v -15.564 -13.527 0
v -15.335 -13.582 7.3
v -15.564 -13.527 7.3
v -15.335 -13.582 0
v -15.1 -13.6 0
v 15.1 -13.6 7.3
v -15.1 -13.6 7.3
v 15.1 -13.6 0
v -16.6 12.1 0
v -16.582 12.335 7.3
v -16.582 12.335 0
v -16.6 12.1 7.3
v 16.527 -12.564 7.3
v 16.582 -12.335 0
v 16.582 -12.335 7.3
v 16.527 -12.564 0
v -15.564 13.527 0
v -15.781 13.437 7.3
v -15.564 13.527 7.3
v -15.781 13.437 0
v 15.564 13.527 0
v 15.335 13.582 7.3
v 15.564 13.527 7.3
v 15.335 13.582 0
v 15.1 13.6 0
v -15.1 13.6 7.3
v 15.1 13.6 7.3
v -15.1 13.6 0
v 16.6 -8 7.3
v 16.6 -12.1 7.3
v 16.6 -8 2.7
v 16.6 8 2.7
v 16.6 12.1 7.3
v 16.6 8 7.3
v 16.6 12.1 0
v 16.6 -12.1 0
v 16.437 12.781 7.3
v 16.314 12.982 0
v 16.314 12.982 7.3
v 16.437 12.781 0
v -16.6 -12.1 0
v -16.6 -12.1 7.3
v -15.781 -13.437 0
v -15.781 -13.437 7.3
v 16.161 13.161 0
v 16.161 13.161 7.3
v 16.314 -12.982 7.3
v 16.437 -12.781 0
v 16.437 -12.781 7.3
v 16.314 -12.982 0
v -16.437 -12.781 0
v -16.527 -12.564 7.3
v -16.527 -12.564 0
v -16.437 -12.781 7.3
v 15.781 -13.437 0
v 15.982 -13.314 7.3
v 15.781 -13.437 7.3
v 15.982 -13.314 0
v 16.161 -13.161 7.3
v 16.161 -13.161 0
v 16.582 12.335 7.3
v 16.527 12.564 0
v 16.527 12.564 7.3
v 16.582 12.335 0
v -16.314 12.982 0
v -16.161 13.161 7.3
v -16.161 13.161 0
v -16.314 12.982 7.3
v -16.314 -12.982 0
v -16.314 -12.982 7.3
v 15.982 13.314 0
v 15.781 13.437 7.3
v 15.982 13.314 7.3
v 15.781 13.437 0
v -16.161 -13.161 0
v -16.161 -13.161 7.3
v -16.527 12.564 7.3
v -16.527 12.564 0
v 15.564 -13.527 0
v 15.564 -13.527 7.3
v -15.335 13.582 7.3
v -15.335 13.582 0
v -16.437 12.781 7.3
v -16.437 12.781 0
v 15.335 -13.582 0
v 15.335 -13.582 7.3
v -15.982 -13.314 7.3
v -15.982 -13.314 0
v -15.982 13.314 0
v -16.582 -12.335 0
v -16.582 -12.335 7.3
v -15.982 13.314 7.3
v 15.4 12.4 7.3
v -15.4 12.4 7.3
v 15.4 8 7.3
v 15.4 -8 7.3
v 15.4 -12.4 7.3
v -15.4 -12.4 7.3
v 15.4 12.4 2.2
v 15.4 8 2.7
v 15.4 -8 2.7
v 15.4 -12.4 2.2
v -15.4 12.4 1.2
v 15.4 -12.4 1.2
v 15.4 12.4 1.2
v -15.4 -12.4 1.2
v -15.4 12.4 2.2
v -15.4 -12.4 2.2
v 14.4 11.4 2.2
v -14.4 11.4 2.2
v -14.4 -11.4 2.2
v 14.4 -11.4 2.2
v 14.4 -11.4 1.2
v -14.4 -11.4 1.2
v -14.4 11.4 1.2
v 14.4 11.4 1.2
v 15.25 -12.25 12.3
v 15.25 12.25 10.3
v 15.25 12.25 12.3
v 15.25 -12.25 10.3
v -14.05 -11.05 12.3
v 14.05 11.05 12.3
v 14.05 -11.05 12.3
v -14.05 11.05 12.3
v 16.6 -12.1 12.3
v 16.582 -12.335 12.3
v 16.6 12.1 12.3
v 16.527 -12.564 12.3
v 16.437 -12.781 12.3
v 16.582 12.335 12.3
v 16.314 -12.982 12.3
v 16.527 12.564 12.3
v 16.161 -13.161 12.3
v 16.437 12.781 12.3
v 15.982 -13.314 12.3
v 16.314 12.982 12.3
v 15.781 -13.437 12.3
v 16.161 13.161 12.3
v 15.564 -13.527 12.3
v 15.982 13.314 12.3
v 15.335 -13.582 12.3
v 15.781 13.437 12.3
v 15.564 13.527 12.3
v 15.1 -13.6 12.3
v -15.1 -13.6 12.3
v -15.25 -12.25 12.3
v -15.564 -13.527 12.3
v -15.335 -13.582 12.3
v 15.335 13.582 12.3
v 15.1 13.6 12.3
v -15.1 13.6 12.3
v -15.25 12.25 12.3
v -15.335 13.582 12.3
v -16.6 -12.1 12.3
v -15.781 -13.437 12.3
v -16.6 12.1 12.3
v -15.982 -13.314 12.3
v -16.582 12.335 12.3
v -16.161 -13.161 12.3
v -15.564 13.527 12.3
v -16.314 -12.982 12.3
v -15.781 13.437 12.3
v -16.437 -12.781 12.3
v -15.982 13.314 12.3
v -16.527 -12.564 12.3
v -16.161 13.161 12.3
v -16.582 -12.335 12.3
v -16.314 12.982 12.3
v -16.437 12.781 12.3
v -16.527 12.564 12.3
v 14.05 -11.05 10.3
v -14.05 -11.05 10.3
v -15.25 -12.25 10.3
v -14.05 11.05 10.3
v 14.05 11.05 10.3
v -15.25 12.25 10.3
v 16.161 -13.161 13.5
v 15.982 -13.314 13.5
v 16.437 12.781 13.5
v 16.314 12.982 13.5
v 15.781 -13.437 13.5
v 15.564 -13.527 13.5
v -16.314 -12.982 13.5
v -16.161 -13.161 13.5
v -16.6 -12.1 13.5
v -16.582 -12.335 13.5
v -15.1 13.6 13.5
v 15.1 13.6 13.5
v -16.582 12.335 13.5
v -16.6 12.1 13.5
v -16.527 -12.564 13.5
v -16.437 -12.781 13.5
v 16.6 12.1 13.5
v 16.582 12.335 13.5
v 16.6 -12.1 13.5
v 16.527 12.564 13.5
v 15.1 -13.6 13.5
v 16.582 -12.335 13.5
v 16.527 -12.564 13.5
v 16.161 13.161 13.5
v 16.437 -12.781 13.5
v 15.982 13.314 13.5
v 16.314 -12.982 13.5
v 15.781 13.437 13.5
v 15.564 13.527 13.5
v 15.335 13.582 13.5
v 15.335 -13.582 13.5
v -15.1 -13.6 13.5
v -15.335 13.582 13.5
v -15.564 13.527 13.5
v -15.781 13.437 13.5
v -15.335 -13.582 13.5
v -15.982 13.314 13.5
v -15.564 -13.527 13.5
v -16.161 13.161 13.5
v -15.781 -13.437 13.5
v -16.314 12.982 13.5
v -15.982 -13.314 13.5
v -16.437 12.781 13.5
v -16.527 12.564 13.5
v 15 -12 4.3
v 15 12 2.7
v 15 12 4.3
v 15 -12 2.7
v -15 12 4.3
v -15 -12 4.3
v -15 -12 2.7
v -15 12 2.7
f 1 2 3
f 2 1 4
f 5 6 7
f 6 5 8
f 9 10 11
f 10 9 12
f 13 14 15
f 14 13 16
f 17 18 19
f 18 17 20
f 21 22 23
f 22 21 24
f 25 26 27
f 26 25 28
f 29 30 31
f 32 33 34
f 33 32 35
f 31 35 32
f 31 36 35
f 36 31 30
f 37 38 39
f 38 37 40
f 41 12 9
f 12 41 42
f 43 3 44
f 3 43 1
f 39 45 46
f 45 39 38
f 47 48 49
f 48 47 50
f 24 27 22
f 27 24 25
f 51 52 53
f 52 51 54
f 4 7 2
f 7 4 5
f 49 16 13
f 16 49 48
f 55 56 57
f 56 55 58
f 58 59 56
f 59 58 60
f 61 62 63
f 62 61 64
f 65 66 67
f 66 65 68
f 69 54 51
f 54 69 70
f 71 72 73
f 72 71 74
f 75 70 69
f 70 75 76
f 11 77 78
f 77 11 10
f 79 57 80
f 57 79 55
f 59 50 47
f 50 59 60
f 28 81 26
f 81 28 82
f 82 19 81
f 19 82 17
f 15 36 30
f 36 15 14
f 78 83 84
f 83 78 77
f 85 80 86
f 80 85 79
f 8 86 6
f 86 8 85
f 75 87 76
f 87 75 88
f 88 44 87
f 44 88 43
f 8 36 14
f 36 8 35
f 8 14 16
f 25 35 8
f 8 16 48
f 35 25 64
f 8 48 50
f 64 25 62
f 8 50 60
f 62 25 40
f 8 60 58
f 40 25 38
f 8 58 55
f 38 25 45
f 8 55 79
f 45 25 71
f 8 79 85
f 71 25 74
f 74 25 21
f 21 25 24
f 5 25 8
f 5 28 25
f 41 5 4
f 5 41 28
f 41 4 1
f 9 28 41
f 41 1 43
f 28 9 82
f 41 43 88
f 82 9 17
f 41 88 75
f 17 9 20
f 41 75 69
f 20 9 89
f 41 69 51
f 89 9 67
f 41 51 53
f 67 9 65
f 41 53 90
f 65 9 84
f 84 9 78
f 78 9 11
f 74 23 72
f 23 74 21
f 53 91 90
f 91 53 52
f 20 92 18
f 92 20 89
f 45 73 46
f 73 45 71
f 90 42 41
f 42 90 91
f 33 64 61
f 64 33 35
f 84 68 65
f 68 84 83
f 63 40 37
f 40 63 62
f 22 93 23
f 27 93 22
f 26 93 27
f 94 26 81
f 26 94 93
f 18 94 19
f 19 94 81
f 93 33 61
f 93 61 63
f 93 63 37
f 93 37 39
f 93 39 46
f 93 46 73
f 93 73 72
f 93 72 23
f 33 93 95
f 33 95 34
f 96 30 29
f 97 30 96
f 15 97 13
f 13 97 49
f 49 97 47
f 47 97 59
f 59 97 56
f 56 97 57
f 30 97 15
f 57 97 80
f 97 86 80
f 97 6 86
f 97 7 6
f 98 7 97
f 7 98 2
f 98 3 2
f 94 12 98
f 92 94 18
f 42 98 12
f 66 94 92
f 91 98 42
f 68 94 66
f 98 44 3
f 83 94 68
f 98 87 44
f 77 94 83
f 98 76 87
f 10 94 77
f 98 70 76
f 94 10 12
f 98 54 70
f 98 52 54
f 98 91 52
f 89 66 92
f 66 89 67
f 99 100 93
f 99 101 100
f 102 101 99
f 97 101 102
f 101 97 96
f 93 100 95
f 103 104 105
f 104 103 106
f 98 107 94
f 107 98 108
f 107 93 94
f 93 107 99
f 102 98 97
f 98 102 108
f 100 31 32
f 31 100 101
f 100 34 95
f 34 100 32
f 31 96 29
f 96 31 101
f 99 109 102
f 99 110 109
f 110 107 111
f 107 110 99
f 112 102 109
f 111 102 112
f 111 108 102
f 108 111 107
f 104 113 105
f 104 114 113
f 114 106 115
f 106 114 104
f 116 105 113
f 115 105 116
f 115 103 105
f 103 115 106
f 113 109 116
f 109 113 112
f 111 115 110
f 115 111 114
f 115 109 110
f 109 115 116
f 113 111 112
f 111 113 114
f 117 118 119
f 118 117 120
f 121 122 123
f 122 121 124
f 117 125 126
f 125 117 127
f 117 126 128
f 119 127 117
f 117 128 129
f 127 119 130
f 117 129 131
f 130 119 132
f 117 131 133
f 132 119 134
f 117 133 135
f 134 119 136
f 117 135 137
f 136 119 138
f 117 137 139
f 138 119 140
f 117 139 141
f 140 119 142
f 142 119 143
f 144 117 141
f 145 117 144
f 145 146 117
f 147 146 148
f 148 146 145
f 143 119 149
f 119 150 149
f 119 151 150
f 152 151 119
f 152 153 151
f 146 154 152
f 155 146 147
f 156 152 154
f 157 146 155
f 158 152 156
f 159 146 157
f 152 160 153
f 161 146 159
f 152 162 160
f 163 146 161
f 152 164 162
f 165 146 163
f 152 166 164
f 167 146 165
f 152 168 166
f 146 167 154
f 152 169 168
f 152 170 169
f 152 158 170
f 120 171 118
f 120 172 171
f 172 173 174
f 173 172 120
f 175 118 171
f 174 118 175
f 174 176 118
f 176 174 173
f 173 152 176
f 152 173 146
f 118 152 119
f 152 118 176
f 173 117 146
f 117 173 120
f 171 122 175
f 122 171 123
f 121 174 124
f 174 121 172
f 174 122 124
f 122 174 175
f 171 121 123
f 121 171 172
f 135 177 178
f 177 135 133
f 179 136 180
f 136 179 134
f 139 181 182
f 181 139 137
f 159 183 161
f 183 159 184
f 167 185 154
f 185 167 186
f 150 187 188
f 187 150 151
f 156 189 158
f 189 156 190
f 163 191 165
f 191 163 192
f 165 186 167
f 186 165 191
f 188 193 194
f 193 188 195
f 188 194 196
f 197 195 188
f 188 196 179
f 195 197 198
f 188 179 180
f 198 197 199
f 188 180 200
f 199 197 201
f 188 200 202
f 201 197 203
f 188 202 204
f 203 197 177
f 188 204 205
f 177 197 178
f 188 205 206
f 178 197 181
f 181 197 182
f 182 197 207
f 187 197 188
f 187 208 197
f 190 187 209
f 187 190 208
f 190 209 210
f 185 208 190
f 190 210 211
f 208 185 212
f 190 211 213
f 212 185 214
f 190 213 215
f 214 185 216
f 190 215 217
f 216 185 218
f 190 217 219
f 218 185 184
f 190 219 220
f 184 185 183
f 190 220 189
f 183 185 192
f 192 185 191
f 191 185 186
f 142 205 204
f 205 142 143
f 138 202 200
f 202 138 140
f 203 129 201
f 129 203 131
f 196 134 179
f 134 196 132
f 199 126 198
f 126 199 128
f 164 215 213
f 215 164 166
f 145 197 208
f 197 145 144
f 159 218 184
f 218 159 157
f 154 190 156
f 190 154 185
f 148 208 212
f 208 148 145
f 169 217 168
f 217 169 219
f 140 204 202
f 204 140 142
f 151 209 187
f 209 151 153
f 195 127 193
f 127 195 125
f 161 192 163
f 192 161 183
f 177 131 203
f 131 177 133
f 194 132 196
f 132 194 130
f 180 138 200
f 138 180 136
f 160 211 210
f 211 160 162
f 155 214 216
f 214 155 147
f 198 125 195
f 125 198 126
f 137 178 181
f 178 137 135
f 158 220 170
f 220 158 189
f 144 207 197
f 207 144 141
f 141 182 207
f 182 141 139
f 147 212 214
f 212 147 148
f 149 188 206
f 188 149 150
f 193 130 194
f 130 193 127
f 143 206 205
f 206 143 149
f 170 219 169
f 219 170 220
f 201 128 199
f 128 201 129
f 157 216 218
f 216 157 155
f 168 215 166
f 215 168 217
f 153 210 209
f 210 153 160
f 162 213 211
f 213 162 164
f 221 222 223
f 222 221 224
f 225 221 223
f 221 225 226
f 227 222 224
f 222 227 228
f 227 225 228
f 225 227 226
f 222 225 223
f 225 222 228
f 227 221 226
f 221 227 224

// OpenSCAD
// ═══════════════════════════════════════════════════════════════════════
// AFE Headstage v1 — Parametric Enclosure (OpenSCAD)
//
// Board: 30.0 × 24.0 × 1.6 mm, 4-layer, RHD2132 + Omnetics A79024
// Export: File → Export → Export as STL (for printing)
//         File → Export → Export as 3MF (if slicer supports it)
//
// To generate from command line:
//   openscad -o enclosure_bottom.stl -D 'part="bottom"' enclosure_v1.scad
//   openscad -o enclosure_lid.stl -D 'part="lid"' enclosure_v1.scad
// ═══════════════════════════════════════════════════════════════════════

// ── Which part to render ──────────────────────────────────────────────
// Set to "bottom", "lid", or "both" (exploded view)
part = "both";

// ── Board dimensions (from KiCad Edge.Cuts) ──────────────────────────
board_x     = 30.0;    // mm, length
board_y     = 24.0;    // mm, width
board_z     = 1.6;     // mm, PCB thickness

// ── Component clearance heights ──────────────────────────────────────
comp_top_z  = 3.0;     // mm, above board top (J5 unmated ~2.5 + margin)
comp_bot_z  = 0.5;     // mm, below board bottom (solder joints)

// ── Enclosure parameters ─────────────────────────────────────────────
wall        = 1.2;     // mm, wall thickness
clearance   = 0.4;     // mm, gap PCB-to-wall (FDM tolerance)
ledge_w     = 1.0;     // mm, PCB support ledge width
ledge_h     = 1.0;     // mm, ledge height from floor
floor_z     = 1.2;     // mm, bottom floor thickness
corner_r    = 1.5;     // mm, external corner fillet
lid_z       = 1.2;     // mm, lid plate thickness
lid_lip     = 2.0;     // mm, lid insertion lip depth
lid_clear   = 0.15;    // mm, clearance per side for lid lip

// ── Connector cutout (J5 on +X short edge) ───────────────────────────
conn_w      = 16.0;    // mm, cutout width
conn_h      = 5.0;     // mm, cutout height
conn_z_off  = 0.0;     // mm, offset from PCB top surface

// ── Derived ──────────────────────────────────────────────────────────
cavity_x    = board_x + 2 * clearance;
cavity_y    = board_y + 2 * clearance;
ext_x       = cavity_x + 2 * wall;
ext_y       = cavity_y + 2 * wall;
tray_int_z  = ledge_h + comp_bot_z + board_z + comp_top_z;
tray_ext_z  = floor_z + tray_int_z;

$fn = 40;  // smoothness for curves

// ═══════════════════════════════════════════════════════════════════════
// MODULES
// ═══════════════════════════════════════════════════════════════════════

module rounded_box(x, y, z, r) {
    // Box with rounded vertical edges, centered XY, bottom at Z=0
    translate([0, 0, z/2])
    hull() {
        for (dx = [-1, 1], dy = [-1, 1])
            translate([dx * (x/2 - r), dy * (y/2 - r), 0])
                cylinder(h = z, r = r, center = true);
    }
}

module bottom_tray() {
    difference() {
        // Outer shell
        rounded_box(ext_x, ext_y, tray_ext_z, corner_r);

        // Cavity (hollowed from top)
        translate([0, 0, floor_z])
            cube([cavity_x, cavity_y, tray_int_z + 1], center = true);
        // Fix: move cavity up so it starts at floor_z
        translate([0, 0, floor_z + (tray_int_z + 1)/2])
            cube([cavity_x, cavity_y, tray_int_z + 1], center = true);

        // Connector cutout on +X face
        conn_z_start = floor_z + ledge_h + comp_bot_z + conn_z_off;
        translate([ext_x/2, 0, conn_z_start + conn_h/2])
            cube([wall + 2, conn_w, conn_h], center = true);
    }

    // PCB support ledge
    difference() {
        translate([0, 0, floor_z])
            cube([cavity_x, cavity_y, ledge_h], center = true);
        // Center offset fix
        translate([0, 0, floor_z + ledge_h/2])
            cube([cavity_x, cavity_y, ledge_h], center = true);

        // Remove inner part (PCB drops into the ledge)
        translate([0, 0, floor_z + ledge_h/2])
            cube([cavity_x - 2*ledge_w, cavity_y - 2*ledge_w, ledge_h + 1],
                 center = true);
    }
}

// Corrected bottom tray using proper Z positioning
module bottom_tray_v2() {
    difference() {
        // Outer shell
        rounded_box(ext_x, ext_y, tray_ext_z, corner_r);

        // Cavity (hollowed from top, leaving floor)
        translate([0, 0, floor_z + tray_int_z/2 + 0.5])
            cube([cavity_x, cavity_y, tray_int_z + 1], center = true);

        // Connector cutout on +X face
        conn_z_start = floor_z + ledge_h + comp_bot_z + conn_z_off;
        translate([ext_x/2, 0, conn_z_start + conn_h/2])
            cube([wall * 3, conn_w, conn_h], center = true);
    }

    // PCB support ledge (ring inside cavity)
    translate([0, 0, floor_z + ledge_h/2])
    difference() {
        cube([cavity_x, cavity_y, ledge_h], center = true);
        cube([cavity_x - 2*ledge_w, cavity_y - 2*ledge_w, ledge_h + 0.1],
             center = true);
    }
}

module lid() {
    lip_x = cavity_x - 2 * lid_clear;
    lip_y = cavity_y - 2 * lid_clear;

    // Main lid plate
    rounded_box(ext_x, ext_y, lid_z, corner_r);

    // Insertion lip (extends downward)
    translate([0, 0, -lid_lip + lid_lip/2])
    difference() {
        cube([lip_x, lip_y, lid_lip], center = true);
        cube([lip_x - 2*wall, lip_y - 2*wall, lid_lip + 0.1], center = true);
    }
}

// ═══════════════════════════════════════════════════════════════════════
// RENDER
// ═══════════════════════════════════════════════════════════════════════

if (part == "bottom") {
    bottom_tray_v2();
}
else if (part == "lid") {
    // Position lid right-side up for printing (lip pointing up)
    translate([0, 0, lid_lip])
        lid();
}
else {
    // "both" — exploded view for visualization
    color("SteelBlue", 0.8)
        bottom_tray_v2();

    color("Orange", 0.6)
        translate([0, 0, tray_ext_z + 5])  // 5mm gap for visibility
            lid();

    // Ghost PCB for reference
    color("DarkGreen", 0.3)
        translate([0, 0, floor_z + ledge_h + comp_bot_z + board_z/2])
            cube([board_x, board_y, board_z], center = true);
}
